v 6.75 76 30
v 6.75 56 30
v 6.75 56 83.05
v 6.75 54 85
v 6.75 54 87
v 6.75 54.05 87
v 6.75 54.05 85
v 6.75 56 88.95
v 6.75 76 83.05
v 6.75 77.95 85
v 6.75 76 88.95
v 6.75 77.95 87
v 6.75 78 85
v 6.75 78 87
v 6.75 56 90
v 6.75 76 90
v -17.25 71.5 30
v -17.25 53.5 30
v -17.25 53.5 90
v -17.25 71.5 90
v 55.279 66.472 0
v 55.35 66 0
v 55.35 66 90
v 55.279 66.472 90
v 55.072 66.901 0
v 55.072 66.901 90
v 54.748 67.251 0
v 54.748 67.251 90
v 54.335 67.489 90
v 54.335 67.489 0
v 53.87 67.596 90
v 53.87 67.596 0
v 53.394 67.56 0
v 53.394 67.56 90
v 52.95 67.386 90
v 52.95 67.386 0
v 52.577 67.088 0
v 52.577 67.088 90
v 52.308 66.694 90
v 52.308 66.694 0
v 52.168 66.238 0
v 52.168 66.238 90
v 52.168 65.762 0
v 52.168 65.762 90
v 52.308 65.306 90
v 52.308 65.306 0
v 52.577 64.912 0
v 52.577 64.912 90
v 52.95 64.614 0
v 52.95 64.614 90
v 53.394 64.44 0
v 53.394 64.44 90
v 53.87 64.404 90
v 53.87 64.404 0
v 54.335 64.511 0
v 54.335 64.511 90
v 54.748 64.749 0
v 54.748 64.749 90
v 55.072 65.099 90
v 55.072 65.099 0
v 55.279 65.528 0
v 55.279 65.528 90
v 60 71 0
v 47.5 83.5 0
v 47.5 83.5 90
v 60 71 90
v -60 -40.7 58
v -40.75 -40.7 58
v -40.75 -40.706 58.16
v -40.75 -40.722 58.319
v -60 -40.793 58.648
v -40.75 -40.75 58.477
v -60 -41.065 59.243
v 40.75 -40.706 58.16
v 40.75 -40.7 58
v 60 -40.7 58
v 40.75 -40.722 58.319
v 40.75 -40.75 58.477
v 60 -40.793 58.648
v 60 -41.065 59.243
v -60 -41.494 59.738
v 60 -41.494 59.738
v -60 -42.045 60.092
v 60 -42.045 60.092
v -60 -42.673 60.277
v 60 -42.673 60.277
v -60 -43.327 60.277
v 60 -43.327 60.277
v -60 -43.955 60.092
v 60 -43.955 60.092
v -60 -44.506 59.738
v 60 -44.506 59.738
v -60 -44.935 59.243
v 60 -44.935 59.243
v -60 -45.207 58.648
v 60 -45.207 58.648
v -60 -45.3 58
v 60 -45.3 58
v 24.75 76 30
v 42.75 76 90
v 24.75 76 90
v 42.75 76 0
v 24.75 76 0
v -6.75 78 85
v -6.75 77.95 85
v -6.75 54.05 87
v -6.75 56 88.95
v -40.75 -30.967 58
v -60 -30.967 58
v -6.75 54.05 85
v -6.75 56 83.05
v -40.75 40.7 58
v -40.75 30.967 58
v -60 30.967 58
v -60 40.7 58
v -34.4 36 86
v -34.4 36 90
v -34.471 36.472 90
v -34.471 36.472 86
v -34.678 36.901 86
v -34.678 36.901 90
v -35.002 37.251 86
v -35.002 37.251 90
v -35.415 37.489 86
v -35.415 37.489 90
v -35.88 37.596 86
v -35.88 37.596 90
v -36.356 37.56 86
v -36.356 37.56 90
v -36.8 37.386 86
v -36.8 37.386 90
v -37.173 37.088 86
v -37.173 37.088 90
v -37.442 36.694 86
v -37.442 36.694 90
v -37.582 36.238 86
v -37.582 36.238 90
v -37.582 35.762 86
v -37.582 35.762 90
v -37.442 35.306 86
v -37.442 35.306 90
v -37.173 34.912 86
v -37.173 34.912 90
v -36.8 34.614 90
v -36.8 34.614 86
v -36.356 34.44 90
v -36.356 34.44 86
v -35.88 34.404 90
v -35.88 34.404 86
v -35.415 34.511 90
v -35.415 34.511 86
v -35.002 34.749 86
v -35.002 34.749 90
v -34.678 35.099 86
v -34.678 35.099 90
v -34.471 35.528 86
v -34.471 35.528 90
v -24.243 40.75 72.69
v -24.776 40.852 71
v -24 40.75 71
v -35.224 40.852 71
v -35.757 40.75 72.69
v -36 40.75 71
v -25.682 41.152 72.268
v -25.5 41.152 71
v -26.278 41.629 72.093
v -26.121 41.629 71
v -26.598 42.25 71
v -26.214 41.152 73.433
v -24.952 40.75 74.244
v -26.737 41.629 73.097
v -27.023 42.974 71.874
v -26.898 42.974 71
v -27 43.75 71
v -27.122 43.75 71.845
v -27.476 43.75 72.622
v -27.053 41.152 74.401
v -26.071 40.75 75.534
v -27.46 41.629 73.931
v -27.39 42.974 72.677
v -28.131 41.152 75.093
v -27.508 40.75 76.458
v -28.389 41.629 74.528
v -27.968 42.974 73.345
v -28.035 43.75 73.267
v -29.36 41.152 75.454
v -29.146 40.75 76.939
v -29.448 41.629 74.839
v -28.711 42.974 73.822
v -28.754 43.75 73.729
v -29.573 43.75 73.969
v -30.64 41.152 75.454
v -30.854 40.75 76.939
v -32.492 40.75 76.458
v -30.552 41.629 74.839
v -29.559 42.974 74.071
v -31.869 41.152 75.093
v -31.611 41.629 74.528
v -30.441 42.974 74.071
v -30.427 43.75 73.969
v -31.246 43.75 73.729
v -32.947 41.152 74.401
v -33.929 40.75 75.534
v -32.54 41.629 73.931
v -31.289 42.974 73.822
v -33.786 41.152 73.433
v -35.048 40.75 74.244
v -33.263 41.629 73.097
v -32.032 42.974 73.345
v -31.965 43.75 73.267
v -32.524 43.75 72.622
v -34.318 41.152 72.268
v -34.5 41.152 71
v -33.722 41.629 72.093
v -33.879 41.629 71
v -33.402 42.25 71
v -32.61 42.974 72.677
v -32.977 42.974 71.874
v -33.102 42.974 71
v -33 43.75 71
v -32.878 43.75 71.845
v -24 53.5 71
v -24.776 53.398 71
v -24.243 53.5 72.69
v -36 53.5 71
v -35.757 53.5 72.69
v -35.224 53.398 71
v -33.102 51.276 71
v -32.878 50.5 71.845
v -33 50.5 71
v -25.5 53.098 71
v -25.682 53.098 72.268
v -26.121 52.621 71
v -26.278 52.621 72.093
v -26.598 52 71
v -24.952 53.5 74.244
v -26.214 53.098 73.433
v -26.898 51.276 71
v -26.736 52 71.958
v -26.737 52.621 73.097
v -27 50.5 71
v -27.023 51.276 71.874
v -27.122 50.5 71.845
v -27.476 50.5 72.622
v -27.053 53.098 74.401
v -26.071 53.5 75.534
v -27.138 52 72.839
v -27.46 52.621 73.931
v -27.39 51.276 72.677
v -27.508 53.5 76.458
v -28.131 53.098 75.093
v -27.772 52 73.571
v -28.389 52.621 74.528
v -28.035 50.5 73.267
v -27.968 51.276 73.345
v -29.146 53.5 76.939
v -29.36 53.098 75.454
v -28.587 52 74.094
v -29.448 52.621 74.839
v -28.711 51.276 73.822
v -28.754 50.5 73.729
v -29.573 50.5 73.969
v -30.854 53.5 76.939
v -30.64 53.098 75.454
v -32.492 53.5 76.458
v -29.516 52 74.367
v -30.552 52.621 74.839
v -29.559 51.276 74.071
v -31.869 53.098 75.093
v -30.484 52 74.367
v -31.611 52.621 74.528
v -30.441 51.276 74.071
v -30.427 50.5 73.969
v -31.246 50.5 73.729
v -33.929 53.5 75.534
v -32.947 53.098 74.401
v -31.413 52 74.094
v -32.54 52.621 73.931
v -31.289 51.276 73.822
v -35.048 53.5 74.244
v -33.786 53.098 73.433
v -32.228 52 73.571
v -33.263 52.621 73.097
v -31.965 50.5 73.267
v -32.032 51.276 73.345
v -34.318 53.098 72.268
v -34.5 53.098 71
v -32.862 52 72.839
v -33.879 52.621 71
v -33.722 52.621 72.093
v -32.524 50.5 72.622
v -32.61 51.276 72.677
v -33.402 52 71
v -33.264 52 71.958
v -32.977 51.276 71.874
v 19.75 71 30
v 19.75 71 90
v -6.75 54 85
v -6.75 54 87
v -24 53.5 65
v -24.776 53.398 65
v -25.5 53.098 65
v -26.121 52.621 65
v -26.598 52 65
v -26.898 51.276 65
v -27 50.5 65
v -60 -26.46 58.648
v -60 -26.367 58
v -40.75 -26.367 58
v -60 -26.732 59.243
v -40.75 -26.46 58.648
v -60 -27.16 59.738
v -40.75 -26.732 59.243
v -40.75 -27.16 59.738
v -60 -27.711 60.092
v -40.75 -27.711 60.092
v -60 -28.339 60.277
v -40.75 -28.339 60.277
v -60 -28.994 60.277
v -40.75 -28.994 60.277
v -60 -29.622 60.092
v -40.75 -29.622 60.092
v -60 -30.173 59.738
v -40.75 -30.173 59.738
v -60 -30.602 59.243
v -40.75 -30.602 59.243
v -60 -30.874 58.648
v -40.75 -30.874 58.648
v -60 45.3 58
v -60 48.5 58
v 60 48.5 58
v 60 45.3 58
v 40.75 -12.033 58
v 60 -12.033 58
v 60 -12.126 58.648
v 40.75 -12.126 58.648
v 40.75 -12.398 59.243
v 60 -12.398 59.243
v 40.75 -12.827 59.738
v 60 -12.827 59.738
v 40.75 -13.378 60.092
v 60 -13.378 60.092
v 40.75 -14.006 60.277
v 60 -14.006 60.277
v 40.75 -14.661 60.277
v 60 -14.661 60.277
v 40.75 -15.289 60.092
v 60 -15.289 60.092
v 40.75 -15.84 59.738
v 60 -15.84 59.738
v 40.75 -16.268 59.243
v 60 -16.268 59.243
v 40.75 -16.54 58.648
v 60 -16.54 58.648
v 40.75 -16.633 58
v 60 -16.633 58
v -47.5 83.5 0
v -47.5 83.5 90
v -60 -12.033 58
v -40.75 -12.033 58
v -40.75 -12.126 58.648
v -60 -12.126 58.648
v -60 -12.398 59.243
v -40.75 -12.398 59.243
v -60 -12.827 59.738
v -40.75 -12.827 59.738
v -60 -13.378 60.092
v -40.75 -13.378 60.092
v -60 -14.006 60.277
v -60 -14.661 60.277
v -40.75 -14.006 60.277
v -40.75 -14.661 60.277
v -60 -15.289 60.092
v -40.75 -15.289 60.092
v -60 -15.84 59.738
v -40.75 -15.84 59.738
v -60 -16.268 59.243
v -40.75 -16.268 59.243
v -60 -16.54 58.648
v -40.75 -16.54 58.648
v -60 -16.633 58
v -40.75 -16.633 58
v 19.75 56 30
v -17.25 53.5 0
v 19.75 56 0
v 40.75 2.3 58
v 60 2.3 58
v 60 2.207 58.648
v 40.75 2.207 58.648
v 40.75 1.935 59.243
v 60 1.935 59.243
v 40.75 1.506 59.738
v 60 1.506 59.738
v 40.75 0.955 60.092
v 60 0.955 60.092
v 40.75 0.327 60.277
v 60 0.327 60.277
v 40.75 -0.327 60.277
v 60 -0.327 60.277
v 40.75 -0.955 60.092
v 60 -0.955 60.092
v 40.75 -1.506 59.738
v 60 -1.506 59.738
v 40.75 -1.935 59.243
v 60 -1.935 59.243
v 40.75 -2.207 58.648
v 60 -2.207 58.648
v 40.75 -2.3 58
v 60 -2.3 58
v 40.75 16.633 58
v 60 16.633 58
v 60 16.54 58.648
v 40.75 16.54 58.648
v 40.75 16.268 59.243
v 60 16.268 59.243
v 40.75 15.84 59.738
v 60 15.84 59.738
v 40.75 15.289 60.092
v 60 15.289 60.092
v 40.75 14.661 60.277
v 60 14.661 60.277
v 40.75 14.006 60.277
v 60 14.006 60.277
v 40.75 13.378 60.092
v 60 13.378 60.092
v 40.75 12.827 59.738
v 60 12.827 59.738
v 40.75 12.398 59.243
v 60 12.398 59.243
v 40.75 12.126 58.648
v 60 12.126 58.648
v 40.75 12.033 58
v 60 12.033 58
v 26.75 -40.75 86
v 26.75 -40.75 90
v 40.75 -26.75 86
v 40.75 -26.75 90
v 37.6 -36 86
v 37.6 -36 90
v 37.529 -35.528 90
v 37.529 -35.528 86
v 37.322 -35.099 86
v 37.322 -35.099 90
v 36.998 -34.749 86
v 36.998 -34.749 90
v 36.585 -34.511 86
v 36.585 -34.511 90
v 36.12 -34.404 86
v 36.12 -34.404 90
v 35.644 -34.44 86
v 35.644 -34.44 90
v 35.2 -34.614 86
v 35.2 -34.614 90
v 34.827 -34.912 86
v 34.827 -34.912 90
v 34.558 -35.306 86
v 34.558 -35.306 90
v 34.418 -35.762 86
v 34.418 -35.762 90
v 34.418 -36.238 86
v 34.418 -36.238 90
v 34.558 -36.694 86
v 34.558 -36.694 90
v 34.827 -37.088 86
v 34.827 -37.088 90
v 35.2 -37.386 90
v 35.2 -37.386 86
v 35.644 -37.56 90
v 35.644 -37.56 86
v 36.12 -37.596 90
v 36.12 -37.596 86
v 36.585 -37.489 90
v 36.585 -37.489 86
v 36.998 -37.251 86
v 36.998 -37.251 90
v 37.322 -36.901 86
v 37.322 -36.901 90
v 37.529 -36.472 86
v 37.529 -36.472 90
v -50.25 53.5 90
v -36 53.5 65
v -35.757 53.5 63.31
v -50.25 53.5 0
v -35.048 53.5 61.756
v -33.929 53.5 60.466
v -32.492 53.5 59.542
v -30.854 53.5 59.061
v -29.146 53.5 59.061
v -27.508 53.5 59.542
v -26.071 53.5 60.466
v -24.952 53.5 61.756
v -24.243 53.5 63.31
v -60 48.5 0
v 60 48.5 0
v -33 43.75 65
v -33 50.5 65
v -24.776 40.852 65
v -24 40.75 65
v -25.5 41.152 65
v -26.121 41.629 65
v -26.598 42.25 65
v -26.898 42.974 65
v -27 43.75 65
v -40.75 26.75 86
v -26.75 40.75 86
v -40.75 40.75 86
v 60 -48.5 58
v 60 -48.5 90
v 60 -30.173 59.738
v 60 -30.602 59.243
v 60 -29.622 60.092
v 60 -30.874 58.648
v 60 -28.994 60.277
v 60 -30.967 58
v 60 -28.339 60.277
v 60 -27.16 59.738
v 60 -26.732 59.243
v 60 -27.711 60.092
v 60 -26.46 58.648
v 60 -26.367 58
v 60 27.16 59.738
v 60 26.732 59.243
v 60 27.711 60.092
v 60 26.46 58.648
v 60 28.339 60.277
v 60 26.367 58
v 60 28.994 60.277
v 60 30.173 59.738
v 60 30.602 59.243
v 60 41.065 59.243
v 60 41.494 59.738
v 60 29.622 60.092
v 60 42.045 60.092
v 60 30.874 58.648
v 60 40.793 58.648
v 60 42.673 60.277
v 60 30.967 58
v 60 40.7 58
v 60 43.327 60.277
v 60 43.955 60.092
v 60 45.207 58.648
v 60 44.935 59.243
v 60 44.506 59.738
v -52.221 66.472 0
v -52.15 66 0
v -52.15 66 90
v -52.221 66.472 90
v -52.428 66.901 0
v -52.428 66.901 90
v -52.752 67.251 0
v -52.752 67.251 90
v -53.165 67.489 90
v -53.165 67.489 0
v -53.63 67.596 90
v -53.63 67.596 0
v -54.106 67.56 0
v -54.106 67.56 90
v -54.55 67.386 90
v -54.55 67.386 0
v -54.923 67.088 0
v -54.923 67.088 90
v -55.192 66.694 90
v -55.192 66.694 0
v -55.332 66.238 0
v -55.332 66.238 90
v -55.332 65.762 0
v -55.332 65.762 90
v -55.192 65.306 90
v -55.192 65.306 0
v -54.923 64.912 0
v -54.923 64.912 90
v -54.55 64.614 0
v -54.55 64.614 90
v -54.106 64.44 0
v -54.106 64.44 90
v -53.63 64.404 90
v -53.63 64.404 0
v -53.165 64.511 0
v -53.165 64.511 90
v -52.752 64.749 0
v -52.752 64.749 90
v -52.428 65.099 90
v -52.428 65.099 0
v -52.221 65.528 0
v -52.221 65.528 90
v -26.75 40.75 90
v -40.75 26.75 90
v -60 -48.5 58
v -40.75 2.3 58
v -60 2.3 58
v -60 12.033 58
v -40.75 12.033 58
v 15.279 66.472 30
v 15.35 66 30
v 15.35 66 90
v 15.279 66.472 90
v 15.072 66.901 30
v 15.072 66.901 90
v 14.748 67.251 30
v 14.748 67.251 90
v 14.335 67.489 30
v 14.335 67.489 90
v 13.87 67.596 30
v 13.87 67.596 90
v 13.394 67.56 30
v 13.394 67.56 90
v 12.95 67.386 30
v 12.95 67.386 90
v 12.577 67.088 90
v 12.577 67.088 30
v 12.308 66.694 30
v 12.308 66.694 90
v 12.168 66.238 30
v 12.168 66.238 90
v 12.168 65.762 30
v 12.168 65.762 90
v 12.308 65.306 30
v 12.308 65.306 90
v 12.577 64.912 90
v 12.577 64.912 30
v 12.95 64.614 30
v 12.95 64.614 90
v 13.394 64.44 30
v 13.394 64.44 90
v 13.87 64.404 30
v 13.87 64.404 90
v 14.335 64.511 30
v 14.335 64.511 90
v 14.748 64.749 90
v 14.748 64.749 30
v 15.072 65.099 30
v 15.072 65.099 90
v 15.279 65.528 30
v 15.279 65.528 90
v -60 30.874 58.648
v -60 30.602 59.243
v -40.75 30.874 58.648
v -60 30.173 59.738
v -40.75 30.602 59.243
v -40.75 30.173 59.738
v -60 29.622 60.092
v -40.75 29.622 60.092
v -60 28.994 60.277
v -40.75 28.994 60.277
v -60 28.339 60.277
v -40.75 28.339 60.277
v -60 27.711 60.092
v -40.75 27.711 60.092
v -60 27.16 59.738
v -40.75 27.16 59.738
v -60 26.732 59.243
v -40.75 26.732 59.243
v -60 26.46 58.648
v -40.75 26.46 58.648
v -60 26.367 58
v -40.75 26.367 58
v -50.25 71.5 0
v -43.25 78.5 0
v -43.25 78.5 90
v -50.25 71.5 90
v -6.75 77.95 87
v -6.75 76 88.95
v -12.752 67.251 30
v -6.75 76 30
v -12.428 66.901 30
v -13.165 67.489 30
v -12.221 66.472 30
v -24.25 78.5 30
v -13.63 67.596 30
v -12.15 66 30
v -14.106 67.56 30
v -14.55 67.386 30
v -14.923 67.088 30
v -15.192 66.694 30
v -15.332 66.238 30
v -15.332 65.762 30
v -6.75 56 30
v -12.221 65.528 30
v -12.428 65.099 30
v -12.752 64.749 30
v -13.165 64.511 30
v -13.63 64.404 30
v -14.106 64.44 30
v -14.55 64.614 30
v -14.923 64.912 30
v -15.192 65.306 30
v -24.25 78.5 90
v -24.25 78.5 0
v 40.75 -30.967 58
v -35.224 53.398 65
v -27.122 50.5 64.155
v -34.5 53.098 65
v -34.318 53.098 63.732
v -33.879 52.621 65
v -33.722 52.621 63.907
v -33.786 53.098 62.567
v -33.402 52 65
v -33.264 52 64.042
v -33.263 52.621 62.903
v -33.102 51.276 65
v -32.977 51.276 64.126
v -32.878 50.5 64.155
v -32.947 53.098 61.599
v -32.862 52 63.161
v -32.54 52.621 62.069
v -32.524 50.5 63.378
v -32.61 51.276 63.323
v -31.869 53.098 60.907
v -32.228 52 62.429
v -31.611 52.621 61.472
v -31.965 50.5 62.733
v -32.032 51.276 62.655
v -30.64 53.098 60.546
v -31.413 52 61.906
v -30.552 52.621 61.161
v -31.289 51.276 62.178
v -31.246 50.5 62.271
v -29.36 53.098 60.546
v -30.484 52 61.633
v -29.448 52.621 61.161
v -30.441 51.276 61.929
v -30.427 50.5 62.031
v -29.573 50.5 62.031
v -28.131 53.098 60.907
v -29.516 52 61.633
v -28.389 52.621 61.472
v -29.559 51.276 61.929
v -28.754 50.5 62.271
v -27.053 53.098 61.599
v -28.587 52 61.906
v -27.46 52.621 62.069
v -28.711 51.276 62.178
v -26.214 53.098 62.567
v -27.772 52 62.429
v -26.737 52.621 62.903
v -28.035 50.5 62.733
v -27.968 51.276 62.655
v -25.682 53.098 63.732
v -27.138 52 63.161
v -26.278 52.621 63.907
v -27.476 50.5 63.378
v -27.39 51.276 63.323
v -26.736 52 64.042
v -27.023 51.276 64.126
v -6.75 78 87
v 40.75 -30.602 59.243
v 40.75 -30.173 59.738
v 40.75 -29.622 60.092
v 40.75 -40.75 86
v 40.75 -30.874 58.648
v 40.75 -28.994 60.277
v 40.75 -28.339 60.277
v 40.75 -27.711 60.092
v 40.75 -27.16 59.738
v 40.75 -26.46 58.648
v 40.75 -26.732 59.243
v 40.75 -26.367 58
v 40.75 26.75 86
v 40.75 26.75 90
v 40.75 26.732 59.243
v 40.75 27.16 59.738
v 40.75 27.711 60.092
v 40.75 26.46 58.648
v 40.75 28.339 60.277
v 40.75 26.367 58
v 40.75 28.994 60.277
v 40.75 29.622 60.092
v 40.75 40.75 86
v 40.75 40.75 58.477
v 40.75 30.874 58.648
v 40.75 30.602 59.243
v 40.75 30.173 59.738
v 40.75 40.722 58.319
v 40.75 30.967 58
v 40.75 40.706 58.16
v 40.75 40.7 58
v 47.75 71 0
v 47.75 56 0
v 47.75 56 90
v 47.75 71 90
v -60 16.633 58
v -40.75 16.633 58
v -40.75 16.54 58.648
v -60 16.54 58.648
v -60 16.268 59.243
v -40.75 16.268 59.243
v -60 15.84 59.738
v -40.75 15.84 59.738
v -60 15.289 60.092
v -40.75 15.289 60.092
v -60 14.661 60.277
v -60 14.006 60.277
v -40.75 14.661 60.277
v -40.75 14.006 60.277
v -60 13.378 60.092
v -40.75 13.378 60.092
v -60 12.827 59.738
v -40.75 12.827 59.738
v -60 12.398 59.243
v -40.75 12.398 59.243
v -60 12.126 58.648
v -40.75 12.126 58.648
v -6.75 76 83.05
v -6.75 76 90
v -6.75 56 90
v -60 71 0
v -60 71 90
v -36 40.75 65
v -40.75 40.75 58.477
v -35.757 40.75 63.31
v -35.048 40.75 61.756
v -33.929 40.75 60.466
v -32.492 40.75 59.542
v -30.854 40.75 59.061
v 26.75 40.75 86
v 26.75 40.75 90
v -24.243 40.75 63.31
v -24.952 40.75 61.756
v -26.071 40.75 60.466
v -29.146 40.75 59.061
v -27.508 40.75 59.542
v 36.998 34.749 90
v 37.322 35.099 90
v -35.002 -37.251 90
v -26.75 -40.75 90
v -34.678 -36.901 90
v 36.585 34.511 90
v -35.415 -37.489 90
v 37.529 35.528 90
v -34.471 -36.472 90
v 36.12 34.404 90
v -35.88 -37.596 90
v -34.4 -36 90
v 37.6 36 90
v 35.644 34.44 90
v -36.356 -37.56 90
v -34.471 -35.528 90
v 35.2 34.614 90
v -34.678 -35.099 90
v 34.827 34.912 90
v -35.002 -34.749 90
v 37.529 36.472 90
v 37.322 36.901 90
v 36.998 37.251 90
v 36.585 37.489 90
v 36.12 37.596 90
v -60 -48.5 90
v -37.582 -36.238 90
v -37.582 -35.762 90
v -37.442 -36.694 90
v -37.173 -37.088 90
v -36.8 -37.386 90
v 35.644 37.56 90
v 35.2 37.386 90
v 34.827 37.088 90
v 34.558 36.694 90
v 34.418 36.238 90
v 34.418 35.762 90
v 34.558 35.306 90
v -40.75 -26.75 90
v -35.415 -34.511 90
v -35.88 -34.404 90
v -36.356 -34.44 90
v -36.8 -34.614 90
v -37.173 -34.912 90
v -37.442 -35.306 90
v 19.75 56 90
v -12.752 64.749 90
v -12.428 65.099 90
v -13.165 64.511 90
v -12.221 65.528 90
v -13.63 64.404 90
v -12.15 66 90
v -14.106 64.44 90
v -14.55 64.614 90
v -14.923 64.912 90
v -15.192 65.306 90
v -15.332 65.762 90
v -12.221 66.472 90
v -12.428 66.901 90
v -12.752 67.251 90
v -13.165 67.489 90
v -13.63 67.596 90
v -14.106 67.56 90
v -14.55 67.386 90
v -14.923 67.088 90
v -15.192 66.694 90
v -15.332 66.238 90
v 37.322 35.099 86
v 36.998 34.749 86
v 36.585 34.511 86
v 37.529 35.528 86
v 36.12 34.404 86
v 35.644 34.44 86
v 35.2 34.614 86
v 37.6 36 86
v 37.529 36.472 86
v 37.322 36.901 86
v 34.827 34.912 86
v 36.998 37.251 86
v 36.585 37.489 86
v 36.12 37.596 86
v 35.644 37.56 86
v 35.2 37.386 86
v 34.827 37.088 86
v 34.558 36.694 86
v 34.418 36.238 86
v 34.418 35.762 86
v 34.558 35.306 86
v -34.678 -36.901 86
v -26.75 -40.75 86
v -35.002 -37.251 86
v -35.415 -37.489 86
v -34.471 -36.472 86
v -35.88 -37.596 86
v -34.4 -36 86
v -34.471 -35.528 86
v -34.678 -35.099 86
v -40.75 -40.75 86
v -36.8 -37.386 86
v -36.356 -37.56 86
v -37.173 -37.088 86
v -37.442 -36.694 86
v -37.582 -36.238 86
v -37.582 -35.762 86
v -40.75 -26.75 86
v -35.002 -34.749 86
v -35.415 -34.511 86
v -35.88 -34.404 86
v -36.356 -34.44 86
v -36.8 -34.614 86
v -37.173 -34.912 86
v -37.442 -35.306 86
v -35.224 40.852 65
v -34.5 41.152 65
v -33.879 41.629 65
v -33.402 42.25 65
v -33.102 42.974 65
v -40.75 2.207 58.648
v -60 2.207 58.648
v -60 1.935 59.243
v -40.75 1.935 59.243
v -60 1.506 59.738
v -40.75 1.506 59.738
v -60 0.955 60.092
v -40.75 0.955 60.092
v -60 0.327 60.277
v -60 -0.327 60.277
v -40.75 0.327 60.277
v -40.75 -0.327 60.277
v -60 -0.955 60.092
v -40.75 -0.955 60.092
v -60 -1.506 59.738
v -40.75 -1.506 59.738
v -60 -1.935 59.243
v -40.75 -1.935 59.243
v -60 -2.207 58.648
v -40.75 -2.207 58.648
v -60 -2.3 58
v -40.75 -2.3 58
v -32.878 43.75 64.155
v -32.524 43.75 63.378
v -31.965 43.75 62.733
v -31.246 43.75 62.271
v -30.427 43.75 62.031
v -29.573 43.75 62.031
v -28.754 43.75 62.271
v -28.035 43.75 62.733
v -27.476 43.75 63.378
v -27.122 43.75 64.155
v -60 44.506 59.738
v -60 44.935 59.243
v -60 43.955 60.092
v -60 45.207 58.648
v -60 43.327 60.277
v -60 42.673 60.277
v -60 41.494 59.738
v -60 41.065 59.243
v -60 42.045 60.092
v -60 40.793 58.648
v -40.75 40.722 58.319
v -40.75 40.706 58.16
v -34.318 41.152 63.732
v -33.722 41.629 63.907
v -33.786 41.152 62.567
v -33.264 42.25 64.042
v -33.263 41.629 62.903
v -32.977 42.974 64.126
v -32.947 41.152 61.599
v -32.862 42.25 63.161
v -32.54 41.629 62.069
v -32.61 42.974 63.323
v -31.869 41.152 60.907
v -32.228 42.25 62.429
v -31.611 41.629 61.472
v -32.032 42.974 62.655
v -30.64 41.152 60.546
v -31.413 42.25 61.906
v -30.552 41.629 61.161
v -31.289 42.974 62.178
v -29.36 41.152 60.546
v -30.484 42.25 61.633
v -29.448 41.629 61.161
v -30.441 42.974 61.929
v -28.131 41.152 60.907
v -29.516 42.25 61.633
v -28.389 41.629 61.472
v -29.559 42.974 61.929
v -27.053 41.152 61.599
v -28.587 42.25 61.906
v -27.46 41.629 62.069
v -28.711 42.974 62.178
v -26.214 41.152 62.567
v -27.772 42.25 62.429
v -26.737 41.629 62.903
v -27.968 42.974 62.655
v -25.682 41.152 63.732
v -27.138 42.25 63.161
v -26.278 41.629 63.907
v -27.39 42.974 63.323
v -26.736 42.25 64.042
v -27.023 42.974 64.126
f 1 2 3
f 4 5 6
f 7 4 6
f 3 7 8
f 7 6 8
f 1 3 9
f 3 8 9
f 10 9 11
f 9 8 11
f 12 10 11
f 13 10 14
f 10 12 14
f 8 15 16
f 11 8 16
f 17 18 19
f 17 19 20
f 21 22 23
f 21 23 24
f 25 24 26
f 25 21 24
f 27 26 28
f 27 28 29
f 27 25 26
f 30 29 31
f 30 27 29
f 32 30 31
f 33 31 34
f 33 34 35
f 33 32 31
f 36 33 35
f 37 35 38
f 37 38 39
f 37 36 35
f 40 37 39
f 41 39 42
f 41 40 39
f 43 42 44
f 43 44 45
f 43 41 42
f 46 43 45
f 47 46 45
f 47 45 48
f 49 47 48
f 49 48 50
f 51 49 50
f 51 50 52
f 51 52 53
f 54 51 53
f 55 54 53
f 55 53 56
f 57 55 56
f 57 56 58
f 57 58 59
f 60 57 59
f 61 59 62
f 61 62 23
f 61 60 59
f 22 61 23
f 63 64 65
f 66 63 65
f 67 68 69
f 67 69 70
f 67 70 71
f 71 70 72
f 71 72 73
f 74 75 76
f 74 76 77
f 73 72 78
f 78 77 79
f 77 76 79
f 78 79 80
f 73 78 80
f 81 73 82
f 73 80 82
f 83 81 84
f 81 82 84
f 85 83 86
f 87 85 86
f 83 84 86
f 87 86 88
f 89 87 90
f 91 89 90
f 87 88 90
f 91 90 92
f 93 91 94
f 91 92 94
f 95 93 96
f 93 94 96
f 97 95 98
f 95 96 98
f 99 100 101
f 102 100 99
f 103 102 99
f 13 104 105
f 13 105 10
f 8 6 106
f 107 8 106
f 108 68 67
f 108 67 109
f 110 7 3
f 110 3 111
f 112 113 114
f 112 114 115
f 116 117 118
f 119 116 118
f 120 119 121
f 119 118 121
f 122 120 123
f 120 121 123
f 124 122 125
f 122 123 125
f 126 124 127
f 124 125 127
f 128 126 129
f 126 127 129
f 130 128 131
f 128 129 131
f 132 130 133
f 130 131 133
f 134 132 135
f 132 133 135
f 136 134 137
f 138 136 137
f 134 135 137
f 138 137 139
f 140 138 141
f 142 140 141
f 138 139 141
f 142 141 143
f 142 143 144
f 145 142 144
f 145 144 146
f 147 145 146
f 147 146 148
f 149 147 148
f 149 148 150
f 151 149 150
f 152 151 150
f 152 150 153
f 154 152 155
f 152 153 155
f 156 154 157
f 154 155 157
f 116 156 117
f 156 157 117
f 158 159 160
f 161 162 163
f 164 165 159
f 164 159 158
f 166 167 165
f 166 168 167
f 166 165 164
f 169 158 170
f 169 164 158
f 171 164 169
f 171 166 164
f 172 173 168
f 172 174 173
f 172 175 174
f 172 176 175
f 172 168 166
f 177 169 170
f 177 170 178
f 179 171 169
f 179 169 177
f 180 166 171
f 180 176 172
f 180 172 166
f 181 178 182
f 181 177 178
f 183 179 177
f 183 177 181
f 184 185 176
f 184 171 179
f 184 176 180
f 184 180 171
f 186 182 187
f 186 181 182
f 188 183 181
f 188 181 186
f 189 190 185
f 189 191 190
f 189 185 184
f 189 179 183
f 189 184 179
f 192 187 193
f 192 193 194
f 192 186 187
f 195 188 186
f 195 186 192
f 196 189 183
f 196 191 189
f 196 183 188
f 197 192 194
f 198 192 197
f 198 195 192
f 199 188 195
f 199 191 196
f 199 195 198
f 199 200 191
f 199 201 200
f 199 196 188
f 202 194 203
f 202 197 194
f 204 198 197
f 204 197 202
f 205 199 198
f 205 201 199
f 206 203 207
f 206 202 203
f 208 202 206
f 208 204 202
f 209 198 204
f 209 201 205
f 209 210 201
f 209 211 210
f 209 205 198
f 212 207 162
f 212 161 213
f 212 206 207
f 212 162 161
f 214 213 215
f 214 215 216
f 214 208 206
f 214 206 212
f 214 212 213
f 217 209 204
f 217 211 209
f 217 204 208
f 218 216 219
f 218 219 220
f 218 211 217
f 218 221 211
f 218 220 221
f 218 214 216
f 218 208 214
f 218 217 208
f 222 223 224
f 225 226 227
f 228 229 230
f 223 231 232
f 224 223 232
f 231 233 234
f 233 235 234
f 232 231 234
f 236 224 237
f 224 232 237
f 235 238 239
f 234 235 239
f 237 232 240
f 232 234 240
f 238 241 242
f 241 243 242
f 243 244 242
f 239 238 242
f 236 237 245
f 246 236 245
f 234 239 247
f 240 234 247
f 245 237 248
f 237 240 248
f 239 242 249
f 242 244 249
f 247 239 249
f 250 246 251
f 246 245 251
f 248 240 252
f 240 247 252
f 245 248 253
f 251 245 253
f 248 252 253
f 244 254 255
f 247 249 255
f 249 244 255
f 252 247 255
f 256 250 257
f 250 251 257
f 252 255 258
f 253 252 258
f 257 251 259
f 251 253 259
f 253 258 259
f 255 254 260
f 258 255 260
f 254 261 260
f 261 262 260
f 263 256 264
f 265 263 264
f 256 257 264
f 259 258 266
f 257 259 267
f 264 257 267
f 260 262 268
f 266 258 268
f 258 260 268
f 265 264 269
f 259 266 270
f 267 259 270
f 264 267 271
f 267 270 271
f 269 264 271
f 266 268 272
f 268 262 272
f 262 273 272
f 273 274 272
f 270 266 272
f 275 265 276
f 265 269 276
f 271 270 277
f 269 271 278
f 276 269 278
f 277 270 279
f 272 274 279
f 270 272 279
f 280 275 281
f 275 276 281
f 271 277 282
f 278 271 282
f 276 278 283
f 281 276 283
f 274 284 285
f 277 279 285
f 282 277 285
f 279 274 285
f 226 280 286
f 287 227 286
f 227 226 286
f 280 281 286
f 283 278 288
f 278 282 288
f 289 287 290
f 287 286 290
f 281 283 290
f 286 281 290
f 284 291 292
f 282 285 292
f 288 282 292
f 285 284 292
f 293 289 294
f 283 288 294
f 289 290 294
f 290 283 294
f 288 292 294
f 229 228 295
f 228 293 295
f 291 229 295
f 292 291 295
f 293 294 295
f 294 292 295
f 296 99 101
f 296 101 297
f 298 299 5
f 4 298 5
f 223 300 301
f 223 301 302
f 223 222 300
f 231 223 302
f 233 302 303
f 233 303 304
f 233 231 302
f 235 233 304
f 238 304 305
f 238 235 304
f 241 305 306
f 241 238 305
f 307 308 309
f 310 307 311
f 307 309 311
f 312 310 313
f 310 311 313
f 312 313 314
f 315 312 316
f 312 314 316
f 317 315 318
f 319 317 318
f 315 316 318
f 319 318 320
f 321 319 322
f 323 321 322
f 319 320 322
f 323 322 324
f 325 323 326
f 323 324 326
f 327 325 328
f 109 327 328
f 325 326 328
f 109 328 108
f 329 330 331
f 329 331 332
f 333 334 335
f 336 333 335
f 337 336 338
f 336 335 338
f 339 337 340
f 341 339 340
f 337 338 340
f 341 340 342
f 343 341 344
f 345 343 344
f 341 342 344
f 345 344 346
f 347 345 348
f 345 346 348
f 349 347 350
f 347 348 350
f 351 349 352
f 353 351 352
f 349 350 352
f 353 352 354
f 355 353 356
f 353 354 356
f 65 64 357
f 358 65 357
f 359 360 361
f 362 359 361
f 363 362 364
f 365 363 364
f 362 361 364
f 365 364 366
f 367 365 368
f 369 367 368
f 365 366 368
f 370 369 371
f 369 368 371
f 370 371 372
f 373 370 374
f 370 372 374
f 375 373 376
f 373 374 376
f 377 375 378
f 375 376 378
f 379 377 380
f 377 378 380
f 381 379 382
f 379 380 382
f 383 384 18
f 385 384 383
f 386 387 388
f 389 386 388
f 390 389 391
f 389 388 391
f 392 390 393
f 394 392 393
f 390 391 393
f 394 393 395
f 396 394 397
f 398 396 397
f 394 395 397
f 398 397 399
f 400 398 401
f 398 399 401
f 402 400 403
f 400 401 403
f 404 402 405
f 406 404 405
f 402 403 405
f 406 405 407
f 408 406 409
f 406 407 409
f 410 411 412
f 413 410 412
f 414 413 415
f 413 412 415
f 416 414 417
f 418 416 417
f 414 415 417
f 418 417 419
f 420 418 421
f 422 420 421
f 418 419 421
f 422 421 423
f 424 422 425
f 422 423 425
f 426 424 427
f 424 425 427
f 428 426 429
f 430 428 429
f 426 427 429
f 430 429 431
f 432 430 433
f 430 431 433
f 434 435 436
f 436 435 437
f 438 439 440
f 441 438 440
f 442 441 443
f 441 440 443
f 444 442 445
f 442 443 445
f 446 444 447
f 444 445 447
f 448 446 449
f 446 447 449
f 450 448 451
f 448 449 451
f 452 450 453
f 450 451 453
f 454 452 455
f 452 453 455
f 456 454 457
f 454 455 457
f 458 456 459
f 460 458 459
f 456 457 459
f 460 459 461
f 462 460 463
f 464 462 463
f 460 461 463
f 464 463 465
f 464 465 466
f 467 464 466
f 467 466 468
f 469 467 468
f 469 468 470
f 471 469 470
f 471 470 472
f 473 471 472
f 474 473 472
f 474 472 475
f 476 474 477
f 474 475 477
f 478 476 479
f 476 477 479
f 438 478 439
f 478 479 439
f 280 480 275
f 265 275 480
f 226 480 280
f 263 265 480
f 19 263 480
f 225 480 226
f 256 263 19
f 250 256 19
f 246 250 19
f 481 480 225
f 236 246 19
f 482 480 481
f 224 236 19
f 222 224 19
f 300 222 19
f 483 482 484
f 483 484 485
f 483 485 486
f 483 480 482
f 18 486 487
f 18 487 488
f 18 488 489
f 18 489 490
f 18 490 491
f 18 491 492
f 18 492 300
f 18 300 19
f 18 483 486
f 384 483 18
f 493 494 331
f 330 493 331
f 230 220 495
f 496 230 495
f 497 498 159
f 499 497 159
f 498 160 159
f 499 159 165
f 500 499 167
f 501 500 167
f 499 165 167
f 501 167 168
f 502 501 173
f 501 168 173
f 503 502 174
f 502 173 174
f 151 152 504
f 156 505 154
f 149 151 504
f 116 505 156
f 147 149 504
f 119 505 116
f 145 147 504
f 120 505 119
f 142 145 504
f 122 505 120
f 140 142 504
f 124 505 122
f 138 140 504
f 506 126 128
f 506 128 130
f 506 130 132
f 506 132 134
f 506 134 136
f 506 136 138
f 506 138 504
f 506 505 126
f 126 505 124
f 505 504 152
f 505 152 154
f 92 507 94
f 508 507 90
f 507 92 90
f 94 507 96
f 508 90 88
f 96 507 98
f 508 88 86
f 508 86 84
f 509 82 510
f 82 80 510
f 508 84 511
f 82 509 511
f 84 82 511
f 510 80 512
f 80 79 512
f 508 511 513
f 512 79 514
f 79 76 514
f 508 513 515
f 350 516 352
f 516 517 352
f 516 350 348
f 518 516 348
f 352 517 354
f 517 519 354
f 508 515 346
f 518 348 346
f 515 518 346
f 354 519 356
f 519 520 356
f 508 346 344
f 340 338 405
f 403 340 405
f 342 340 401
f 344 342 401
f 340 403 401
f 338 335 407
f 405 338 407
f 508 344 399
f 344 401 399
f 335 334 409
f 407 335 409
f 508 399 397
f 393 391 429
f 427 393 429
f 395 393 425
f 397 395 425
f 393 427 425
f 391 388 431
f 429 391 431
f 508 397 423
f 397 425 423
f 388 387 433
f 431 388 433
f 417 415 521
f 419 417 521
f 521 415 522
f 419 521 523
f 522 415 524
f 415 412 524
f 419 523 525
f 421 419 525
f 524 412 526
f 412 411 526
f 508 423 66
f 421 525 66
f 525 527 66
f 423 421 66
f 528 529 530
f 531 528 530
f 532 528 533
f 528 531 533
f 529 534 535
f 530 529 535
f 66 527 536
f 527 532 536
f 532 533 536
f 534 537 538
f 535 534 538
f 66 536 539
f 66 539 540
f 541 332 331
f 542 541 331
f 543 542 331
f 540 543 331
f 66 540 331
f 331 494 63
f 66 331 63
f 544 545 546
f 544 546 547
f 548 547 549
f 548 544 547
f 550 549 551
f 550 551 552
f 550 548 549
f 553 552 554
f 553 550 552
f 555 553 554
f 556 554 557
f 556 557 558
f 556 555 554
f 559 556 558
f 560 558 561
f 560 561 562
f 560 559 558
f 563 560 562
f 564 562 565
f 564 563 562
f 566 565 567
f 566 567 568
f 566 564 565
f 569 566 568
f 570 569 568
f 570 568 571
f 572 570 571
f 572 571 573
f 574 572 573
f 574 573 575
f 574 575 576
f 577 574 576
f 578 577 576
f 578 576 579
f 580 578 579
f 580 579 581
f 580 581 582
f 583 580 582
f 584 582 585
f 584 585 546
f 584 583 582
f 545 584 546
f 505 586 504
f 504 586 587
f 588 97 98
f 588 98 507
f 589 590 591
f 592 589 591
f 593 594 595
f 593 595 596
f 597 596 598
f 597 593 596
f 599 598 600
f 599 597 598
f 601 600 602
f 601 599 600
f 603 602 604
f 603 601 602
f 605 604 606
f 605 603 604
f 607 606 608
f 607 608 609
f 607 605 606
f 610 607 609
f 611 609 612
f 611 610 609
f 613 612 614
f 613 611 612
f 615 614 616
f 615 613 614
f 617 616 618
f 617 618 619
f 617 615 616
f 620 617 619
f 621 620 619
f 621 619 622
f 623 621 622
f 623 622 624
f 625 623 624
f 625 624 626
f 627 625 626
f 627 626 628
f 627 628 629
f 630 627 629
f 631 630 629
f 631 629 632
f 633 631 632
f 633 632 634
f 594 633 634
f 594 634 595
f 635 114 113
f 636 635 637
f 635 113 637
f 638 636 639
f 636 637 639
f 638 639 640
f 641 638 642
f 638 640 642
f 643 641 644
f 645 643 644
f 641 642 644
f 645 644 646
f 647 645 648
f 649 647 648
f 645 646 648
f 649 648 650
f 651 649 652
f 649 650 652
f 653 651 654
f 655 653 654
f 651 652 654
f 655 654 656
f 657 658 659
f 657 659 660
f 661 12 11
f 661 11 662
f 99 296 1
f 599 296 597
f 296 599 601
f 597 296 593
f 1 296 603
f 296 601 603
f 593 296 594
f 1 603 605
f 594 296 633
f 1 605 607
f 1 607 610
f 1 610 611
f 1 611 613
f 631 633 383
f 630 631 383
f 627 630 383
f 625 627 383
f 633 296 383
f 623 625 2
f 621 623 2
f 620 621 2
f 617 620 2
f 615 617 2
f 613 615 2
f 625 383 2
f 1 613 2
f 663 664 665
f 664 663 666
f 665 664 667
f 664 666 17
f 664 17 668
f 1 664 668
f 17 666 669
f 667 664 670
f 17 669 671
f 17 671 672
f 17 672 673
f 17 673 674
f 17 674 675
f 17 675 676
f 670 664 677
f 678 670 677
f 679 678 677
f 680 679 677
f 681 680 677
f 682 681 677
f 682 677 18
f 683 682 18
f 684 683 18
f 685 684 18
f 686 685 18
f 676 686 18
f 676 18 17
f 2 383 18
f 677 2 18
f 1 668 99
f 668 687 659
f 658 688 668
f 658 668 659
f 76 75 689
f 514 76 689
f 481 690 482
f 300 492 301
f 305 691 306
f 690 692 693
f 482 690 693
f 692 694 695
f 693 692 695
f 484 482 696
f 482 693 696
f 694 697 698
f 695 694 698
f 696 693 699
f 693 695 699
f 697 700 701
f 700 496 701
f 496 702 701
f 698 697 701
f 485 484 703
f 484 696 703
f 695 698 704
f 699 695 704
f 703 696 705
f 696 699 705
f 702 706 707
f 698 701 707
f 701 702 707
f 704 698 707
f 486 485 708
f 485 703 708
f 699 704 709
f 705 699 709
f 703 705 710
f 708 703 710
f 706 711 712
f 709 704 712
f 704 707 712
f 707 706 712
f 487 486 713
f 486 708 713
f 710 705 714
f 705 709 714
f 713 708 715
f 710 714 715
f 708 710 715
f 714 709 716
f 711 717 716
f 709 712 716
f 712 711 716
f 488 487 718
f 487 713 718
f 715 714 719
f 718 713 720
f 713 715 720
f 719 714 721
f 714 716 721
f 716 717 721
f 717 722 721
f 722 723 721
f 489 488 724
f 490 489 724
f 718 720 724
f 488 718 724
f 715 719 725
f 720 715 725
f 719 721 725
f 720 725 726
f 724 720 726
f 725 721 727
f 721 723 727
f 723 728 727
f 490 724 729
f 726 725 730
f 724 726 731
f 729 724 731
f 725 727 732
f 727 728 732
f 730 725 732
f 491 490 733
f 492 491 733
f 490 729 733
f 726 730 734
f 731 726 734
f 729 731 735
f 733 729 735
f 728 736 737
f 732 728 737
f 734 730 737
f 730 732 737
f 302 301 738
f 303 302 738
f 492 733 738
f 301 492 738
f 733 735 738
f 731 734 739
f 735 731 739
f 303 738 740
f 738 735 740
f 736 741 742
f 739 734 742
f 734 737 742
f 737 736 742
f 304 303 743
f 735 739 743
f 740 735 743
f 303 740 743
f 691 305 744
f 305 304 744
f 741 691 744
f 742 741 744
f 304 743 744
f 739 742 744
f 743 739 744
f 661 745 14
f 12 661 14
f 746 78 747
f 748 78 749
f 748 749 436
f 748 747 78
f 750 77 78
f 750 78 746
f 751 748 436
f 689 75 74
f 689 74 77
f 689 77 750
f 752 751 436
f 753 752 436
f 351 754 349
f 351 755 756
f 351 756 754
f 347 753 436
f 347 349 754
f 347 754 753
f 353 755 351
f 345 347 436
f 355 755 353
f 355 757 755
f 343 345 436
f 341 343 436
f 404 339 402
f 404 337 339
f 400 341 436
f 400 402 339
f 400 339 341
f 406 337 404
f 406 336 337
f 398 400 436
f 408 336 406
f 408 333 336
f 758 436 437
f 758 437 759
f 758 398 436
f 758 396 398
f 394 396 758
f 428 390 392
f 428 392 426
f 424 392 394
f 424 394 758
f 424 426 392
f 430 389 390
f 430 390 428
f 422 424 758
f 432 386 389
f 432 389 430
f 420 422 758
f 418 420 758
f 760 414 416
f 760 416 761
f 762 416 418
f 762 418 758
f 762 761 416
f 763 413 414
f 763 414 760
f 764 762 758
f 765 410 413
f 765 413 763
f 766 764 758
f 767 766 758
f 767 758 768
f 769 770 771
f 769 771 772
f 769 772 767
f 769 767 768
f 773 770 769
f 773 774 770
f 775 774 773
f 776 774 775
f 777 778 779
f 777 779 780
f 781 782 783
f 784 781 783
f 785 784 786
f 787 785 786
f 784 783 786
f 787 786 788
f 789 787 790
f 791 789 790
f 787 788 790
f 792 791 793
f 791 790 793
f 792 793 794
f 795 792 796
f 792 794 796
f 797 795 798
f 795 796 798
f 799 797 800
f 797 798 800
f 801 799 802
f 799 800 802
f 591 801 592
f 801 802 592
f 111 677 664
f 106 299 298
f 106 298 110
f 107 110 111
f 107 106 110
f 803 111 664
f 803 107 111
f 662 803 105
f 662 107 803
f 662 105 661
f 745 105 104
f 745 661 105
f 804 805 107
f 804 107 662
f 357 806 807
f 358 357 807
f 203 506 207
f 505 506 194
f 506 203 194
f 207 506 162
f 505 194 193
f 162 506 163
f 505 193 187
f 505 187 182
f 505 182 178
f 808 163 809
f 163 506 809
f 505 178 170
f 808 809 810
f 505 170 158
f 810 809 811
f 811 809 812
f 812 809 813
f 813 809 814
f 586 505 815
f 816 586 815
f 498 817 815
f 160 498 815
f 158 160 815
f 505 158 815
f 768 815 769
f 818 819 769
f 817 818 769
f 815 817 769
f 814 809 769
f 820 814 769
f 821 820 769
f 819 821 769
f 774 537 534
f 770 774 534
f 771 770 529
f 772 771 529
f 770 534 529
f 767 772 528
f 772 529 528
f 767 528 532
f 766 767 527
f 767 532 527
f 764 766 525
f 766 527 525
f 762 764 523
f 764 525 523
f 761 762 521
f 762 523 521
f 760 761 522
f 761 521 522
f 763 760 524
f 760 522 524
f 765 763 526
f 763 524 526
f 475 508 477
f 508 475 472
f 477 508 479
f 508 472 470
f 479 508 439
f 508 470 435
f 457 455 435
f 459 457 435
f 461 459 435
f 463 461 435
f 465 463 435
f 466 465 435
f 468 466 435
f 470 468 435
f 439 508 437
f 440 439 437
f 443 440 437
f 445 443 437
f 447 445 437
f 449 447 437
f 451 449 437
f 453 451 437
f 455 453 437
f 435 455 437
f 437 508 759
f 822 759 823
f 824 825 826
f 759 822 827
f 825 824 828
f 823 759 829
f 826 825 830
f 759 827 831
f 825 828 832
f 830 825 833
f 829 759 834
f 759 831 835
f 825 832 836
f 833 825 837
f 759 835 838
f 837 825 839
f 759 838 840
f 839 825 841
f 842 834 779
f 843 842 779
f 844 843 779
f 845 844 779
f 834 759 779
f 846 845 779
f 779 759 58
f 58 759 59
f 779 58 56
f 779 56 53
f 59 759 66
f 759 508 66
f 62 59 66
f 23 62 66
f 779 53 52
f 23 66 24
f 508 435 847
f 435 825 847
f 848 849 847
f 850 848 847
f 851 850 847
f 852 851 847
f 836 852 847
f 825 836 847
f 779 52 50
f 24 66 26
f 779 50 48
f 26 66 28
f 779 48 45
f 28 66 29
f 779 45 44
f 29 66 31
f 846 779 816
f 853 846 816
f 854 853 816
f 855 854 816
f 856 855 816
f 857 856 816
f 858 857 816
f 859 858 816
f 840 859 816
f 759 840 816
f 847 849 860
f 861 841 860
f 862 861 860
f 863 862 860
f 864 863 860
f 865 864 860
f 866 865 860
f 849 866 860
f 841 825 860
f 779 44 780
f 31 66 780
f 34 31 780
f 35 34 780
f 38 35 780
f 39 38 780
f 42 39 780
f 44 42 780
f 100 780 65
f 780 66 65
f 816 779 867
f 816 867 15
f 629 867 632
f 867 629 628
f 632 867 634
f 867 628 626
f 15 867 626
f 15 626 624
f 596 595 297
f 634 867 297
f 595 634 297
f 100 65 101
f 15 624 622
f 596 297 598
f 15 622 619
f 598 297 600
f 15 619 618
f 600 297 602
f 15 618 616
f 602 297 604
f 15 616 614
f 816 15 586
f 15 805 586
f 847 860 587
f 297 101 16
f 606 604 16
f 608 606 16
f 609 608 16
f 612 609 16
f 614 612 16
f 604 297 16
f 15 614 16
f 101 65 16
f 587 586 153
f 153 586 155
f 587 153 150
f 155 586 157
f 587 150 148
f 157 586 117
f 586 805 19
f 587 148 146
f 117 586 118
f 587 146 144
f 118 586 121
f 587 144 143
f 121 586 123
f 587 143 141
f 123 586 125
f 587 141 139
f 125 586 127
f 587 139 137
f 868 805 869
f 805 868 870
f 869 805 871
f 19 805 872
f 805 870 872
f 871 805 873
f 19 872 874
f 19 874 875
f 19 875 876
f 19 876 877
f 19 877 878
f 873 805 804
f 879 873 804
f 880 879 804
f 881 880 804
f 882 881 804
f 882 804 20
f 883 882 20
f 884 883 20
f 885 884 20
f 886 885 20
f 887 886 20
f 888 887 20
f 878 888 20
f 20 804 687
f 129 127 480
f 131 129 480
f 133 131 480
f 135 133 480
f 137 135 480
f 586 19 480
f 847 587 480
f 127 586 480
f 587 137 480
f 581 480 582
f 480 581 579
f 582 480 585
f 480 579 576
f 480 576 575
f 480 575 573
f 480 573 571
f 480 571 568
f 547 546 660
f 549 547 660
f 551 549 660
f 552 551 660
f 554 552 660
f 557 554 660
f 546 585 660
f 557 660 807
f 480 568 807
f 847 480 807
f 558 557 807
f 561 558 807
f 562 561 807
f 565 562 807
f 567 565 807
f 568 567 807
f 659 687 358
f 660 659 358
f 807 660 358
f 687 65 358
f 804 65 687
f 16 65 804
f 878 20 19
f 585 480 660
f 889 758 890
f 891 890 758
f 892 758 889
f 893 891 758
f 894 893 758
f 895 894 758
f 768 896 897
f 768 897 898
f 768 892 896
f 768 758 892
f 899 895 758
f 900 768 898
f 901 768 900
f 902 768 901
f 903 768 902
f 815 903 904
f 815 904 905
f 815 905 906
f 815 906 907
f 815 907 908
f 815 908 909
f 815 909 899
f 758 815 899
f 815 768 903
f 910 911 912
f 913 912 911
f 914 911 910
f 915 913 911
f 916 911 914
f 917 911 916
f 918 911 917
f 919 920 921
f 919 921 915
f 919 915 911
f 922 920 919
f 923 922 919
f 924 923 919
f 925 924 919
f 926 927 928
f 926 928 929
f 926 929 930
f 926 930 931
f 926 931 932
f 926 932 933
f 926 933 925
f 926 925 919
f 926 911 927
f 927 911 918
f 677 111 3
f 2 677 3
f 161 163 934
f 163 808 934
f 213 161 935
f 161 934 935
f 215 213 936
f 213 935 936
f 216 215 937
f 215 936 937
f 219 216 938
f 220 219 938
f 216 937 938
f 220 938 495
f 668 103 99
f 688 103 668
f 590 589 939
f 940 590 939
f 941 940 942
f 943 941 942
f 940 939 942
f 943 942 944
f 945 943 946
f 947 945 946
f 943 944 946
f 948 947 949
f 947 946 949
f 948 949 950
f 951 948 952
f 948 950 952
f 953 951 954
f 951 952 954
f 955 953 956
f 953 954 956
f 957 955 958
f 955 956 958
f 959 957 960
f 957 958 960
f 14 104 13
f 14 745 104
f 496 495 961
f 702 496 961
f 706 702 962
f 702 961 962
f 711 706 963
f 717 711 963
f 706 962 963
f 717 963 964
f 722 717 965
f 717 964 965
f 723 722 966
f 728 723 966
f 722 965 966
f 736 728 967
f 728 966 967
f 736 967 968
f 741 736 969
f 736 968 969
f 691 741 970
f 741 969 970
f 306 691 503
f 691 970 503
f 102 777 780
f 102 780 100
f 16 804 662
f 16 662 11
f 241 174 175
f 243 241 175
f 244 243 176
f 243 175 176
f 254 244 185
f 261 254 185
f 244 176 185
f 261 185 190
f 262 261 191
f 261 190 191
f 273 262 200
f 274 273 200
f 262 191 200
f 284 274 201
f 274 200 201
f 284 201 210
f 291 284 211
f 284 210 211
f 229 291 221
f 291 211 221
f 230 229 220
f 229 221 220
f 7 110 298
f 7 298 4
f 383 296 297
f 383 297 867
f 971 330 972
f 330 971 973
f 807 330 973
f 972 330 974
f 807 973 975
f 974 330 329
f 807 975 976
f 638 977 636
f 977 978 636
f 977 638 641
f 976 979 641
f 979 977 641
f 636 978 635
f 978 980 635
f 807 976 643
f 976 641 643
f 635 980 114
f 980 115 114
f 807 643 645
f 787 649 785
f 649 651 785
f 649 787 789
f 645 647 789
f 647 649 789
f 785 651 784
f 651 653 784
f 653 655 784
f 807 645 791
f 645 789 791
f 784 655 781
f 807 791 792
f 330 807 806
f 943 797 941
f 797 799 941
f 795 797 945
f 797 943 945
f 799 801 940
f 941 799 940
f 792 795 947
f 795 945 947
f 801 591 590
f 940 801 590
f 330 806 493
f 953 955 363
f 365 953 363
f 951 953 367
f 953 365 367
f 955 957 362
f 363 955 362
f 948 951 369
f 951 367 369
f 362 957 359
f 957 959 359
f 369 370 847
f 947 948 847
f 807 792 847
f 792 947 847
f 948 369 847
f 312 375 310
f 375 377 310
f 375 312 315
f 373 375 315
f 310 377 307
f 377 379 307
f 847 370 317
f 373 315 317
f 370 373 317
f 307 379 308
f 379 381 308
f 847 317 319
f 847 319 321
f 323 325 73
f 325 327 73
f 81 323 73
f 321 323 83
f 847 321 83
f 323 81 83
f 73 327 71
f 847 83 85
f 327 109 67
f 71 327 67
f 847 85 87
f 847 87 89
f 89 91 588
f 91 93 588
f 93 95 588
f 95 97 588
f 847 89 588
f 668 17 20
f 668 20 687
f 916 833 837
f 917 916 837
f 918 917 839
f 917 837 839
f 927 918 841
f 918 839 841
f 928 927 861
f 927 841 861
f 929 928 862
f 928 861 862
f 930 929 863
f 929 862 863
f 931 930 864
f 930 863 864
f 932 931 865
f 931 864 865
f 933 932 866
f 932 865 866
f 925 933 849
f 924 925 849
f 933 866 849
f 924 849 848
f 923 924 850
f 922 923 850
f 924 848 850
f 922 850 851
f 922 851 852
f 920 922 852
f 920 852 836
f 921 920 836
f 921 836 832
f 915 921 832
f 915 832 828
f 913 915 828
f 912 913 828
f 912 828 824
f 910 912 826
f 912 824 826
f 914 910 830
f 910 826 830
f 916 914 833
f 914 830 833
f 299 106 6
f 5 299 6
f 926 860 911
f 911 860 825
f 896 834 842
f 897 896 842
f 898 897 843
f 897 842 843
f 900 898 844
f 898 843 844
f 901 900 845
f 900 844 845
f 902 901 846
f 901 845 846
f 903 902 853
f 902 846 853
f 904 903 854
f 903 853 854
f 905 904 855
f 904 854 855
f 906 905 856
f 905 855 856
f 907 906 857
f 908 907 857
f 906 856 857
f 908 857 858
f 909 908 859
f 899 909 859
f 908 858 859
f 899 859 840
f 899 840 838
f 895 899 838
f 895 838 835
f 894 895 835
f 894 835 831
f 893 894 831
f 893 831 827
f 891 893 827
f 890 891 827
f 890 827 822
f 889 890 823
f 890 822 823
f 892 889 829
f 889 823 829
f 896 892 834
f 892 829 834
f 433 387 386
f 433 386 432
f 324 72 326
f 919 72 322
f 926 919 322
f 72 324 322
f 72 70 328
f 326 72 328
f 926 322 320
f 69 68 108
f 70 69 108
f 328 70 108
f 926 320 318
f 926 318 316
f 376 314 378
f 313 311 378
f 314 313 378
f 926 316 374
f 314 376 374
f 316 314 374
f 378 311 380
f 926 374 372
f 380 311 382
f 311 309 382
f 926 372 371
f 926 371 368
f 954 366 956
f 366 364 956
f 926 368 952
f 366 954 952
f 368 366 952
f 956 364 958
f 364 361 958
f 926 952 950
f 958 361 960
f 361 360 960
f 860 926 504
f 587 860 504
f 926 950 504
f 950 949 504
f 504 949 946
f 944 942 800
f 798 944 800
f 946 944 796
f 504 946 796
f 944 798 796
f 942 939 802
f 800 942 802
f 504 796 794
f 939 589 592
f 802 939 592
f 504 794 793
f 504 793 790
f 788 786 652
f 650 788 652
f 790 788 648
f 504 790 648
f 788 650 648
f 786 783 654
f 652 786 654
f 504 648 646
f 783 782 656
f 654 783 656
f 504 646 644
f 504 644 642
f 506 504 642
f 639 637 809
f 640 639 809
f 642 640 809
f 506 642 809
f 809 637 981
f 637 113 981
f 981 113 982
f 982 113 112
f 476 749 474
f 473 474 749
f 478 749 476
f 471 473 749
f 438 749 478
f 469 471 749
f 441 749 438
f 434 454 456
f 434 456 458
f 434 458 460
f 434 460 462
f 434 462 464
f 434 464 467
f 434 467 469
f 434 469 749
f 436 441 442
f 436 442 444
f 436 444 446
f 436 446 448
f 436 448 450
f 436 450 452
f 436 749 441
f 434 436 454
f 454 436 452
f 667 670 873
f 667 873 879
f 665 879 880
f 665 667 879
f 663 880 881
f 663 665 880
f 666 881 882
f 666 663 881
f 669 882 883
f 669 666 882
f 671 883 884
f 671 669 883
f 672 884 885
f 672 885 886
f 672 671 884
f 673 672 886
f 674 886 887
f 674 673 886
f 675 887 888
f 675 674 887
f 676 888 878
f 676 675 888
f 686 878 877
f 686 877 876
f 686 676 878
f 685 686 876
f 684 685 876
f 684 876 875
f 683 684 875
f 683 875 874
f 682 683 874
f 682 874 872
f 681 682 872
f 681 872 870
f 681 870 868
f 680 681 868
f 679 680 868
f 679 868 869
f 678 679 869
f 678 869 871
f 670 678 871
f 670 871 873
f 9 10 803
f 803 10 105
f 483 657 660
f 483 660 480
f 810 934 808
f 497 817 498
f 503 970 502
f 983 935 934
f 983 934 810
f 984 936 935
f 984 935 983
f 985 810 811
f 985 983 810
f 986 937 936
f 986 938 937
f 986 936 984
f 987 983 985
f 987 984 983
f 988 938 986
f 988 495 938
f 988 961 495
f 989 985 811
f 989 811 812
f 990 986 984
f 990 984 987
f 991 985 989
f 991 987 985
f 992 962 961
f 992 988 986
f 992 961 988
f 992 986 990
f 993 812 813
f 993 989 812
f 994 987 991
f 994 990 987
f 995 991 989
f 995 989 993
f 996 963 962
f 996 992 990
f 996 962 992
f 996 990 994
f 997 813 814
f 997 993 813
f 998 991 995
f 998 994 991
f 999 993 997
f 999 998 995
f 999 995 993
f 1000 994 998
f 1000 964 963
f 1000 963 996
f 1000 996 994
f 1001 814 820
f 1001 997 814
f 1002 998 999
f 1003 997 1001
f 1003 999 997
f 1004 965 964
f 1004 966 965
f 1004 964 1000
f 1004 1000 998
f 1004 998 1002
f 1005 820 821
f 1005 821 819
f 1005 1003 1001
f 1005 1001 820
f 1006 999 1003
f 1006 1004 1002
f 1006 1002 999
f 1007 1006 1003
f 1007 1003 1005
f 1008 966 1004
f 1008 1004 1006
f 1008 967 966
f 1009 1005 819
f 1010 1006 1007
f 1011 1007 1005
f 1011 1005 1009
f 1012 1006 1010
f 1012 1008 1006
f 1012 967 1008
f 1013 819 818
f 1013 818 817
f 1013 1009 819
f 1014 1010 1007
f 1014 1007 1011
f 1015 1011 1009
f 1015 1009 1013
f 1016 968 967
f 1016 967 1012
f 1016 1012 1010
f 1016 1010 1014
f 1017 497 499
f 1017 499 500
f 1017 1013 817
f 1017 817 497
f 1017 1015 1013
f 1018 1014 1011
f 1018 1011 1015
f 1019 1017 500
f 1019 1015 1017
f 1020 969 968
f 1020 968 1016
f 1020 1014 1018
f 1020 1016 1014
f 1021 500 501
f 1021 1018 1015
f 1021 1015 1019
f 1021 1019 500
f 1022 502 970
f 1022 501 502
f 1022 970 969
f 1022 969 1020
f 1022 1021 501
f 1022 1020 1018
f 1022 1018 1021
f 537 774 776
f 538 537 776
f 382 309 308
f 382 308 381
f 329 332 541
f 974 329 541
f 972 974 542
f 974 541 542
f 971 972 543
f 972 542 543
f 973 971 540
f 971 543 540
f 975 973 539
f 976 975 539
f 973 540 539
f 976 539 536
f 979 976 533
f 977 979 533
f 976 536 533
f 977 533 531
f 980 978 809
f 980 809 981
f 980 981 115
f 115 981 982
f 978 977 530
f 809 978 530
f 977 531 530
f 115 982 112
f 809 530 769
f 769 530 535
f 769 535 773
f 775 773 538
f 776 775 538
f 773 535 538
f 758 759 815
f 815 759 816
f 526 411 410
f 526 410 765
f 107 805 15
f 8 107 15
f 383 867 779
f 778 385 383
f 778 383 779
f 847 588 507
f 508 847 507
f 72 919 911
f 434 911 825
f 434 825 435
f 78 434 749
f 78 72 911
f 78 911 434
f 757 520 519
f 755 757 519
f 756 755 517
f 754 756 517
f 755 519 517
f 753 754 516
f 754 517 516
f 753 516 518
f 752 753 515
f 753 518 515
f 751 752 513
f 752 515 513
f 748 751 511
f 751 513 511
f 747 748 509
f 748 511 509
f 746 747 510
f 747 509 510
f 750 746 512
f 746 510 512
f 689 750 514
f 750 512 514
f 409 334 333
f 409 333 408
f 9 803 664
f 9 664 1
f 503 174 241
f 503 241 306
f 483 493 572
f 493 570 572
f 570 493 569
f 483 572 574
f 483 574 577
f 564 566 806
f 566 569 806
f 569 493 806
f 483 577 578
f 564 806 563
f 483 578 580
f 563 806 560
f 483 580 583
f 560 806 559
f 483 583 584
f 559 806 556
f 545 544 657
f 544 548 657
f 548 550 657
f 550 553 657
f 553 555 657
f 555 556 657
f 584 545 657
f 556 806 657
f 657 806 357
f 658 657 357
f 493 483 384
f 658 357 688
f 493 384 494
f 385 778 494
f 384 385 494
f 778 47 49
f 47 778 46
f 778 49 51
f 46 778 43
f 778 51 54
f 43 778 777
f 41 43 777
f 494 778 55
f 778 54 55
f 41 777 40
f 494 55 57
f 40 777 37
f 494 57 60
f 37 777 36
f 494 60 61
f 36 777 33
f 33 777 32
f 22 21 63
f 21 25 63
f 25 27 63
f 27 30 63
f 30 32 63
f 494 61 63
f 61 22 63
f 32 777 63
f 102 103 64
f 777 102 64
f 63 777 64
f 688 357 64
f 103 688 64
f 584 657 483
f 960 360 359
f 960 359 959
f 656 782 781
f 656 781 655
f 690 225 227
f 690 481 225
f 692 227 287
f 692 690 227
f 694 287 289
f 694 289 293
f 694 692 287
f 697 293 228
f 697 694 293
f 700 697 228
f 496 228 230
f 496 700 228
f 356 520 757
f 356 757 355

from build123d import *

# Parameters (mm, degrees)
SKETCH_R        = 1.6
SKETCH_W        = 81.5
SKETCH_H        = 81.5
PAD_DEPTH       = 90
POCKET_DEPTH    = 120.001
SKETCH002_R     = 1.6
PAD001_DEPTH    = 4
POCKET001_DEPTH = 30
CHAMFER_SIZE    = 12.5
SKETCH005_W     = 13.5
SKETCH005_H     = 20
POCKET002_DEPTH = 90.001
SKETCH006_W     = 13.5
SKETCH006_H     = 24
POCKET003_DEPTH = 1
CHAMFER001_SIZE = 1.95
POCKET004_DEPTH = 15
FILLET_R        = 3


with BuildPart() as part:
    # Sketch → Pad (new body)
    with BuildSketch(Plane.XY):
        Polygon((-60, -48.5), (60, -48.5), (60, 48.5), (60, 83.5), (-60, 83.5), (-60, 48.5), align=None)
        with Locations((-53.75, 66)):
            Circle(SKETCH_R, mode=Mode.SUBTRACT)
        with Locations((-13.75, 66)):
            Circle(SKETCH_R, mode=Mode.SUBTRACT)
        with Locations((13.75, 66)):
            Circle(SKETCH_R, mode=Mode.SUBTRACT)
        with Locations((53.75, 66)):
            Circle(SKETCH_R, mode=Mode.SUBTRACT)
        Rectangle(SKETCH_W, SKETCH_H, mode=Mode.SUBTRACT)
        Polygon((-50.25, 53.5), (-17.25, 53.5), (-17.25, 71.5), (-24.25, 78.5), (-43.25, 78.5), (-50.25, 71.5), align=None, mode=Mode.SUBTRACT)
        Polygon((19.75, 56), (47.75, 56), (47.75, 71), (42.75, 76), (24.75, 76), (19.75, 71), align=None, mode=Mode.SUBTRACT)
    extrude(amount=PAD_DEPTH)

    # Sketch001 (on Face26 of Pad) → Pocket (cut, through all)
    with BuildSketch(Plane.YZ.offset(60)):
        with BuildLine():
            ThreePointArc((-40.7, 58), (-43, 60.3), (-45.3, 58))
            Line((-45.3, 58), (-48.5, 58))
            Line((-48.5, 0), (-48.5, 58))
            Line((-48.5, 0), (48.5, -0.061623))
            Line((48.5, -0.061623), (48.5, 58))
            Line((48.5, 58), (45.3, 58))
            ThreePointArc((45.3, 58), (43, 60.3), (40.7, 58))
            Line((30.966667, 58), (40.7, 58))
            ThreePointArc((30.966667, 58), (28.666667, 60.3), (26.366667, 58))
            Line((16.633333, 58), (26.366667, 58))
            ThreePointArc((16.633333, 58), (14.333333, 60.3), (12.033333, 58))
            Line((2.3, 58), (12.033333, 58))
            ThreePointArc((2.3, 58), (0, 60.3), (-2.3, 58))
            Line((-12.033333, 58), (-2.3, 58))
            ThreePointArc((-12.033333, 58), (-14.333333, 60.3), (-16.633333, 58))
            Line((-26.366667, 58), (-16.633333, 58))
            ThreePointArc((-26.366667, 58), (-28.666667, 60.3), (-30.966667, 58))
            Line((-40.7, 58), (-30.966667, 58))
        make_face()
    extrude(amount=-POCKET_DEPTH, mode=Mode.SUBTRACT)

    # Sketch002 (on Face24 of Pad) → Pad001 (join)
    with BuildSketch(Plane.XY.offset(90)):
        Polygon((-40.75, -40.75), (-40.75, -26.75), (-26.75, -40.75), align=None)
        with Locations((-36, -36)):
            Circle(SKETCH002_R, mode=Mode.SUBTRACT)
        Polygon((40.75, -40.75), (26.75, -40.75), (40.75, -26.75), align=None)
        with Locations((36, -36)):
            Circle(SKETCH002_R, mode=Mode.SUBTRACT)
        Polygon((40.75, 40.75), (40.75, 26.75), (26.75, 40.75), align=None)
        with Locations((36, 36)):
            Circle(SKETCH002_R, mode=Mode.SUBTRACT)
        Polygon((-40.75, 40.75), (-26.75, 40.75), (-40.75, 26.75), align=None)
        with Locations((-36, 36)):
            Circle(SKETCH002_R, mode=Mode.SUBTRACT)
    extrude(amount=-PAD001_DEPTH)

    # Sketch004 (on Face7 of Pad001) → Pocket001 (cut)
    with BuildSketch(Plane(origin=(0, 0, 0), x_dir=(1, 0, 0), z_dir=(0, 0, -1))):
        Polygon((-17.25, -53.5), (19.75, -56), (47.75, -56), (47.75, -71), (42.75, -76), (24.75, -76), (-24.25, -78.5), (-43.25, -78.5), (-50.25, -71.5), (-50.25, -53.5), align=None)
    extrude(amount=-POCKET001_DEPTH, mode=Mode.SUBTRACT)

    # Chamfer
    chamfer_edges = [part.edges().sort_by_distance(p)[0] for p in [
        (60, 83.5, 45),
        (-60, 83.5, 45),
    ]]
    chamfer(chamfer_edges, length=CHAMFER_SIZE)

    # Sketch005 → Pocket002 (cut, through all)
    with BuildSketch(Plane.XY.offset(90)):
        with Locations((0, 66)):
            Rectangle(SKETCH005_W, SKETCH005_H)
    extrude(amount=-POCKET002_DEPTH, mode=Mode.SUBTRACT)

    # Sketch006 (on Face8 of Pocket002) → Pocket003 (cut, symmetric)
    with BuildSketch(Plane.XY.offset(86)):
        with Locations((0, 66)):
            Rectangle(SKETCH006_W, SKETCH006_H)
    extrude(amount=POCKET003_DEPTH, both=True, mode=Mode.SUBTRACT)

    # Chamfer001
    chamfer001_edges = [part.edges().sort_by_distance(p)[0] for p in [
        (0, 76, 87),
        (0, 76, 85),
        (0, 56, 87),
        (0, 56, 85),
    ]]
    chamfer(chamfer001_edges, length=CHAMFER001_SIZE)

    # Sketch007 (on Face33 of Chamfer001) → Pocket004 (cut)
    with BuildSketch(Plane.XZ.offset(-40.75)):
        with BuildLine():
            ThreePointArc((-27, 71), (-30, 74), (-33, 71))
            Line((-33, 71), (-33, 65))
            ThreePointArc((-33, 65), (-30, 62), (-27, 65))
            Line((-27, 71), (-27, 65))
        make_face()
    extrude(amount=-POCKET004_DEPTH, mode=Mode.SUBTRACT)

    # Fillet
    fillet_edges = [part.edges().sort_by_distance(p)[0] for p in [
        (-30, 53.5, 62),
        (-33, 40.75, 68),
    ]]
    fillet(fillet_edges, radius=FILLET_R)


solid = part.part
